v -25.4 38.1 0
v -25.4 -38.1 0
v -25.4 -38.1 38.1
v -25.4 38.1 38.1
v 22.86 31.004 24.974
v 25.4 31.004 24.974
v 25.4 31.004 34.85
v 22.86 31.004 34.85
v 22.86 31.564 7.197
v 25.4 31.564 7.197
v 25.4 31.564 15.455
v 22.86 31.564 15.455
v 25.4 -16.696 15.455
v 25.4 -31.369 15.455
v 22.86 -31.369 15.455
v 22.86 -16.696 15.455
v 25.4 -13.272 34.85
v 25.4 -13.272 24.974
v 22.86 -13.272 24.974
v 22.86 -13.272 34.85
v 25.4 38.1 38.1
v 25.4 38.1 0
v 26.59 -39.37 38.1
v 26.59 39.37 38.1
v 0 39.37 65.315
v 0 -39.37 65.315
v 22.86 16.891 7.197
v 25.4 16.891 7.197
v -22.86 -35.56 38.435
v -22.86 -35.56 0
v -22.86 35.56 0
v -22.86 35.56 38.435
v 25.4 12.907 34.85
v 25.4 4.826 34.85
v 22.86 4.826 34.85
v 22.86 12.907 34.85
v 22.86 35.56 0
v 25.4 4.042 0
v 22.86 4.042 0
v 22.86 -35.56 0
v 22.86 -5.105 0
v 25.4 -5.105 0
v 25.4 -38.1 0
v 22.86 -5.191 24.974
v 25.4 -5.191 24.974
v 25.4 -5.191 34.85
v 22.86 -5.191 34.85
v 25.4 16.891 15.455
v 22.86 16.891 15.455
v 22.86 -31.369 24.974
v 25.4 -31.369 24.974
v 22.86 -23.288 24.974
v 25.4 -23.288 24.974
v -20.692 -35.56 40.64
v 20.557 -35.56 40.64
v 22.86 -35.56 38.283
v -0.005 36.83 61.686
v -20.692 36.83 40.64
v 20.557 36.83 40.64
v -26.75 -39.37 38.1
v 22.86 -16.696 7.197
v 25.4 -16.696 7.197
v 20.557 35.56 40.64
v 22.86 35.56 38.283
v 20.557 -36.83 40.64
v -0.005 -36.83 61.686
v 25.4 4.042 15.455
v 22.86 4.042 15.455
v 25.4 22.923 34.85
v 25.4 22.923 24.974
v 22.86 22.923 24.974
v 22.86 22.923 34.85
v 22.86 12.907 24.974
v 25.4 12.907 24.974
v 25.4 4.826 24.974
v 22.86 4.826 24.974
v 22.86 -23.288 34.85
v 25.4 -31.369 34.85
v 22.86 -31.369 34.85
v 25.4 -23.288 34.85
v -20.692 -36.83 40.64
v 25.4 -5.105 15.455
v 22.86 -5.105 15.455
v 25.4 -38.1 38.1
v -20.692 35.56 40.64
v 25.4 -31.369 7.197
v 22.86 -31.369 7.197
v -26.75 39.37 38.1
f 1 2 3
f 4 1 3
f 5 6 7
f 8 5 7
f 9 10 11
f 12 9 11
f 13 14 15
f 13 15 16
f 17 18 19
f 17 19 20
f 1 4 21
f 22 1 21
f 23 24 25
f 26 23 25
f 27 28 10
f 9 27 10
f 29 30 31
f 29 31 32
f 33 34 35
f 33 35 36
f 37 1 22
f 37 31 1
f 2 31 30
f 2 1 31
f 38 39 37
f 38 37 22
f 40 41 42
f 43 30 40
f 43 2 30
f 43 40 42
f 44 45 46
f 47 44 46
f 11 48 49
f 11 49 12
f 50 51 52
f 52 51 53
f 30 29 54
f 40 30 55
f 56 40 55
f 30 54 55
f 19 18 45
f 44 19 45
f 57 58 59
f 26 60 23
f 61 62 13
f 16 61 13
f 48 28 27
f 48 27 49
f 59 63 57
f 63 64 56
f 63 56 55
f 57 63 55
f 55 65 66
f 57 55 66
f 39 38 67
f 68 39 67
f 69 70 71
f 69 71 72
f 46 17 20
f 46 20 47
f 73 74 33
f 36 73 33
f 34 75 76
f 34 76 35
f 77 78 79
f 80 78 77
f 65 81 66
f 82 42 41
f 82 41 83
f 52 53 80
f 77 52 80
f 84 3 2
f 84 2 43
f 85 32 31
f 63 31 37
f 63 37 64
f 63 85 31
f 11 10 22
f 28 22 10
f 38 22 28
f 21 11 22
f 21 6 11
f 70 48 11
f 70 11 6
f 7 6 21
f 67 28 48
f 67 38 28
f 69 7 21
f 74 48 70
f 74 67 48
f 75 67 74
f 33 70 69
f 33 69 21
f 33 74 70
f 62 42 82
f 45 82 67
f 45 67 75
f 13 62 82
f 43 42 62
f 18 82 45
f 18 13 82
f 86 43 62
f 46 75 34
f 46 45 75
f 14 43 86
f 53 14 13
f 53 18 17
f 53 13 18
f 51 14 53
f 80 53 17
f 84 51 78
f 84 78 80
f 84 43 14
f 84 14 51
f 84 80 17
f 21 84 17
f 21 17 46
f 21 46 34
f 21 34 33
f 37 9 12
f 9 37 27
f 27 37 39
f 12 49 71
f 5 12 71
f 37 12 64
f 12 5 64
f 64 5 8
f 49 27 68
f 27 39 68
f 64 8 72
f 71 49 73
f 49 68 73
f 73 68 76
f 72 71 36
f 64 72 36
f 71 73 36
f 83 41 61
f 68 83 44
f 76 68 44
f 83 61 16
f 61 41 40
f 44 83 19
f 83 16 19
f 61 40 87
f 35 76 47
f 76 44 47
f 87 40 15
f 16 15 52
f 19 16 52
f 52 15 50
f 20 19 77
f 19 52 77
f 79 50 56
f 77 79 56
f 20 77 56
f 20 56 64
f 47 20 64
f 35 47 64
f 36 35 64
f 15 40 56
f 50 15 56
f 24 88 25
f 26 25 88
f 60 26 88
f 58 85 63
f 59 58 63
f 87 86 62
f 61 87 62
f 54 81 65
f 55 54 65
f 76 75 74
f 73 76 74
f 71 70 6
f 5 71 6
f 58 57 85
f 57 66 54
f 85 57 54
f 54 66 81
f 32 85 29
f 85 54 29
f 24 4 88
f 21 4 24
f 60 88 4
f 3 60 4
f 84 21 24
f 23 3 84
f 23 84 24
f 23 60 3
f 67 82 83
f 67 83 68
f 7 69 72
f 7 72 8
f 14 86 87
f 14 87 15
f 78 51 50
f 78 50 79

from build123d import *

# Parameters (mm, degrees)
F0_W          = 50.8
F0_H          = 38.1
F2_DEPTH      = 38.1
F2_DEPTH_BACK = 38.1
F3_DEPTH      = 39.37
F3_DEPTH_BACK = 39.37
F4_T          = -2.54
F6_W          = 9.1468244791
F6_H          = 15.4547751881
F6_W_2        = 8.080781489
F6_H_2        = 9.8759858869
F6_W_3        = 14.6728920285
F6_H_3        = 8.2574296976
F7_DEPTH      = 2.54


# Not quite as in the source:
# - the program builds the solid bodies; features that only make, move or delete a surface that nothing else refers to are left out


with BuildPart() as f2:
    # F0 (on Front) → F2 (new body, two sides)
    with BuildSketch(Plane.XZ) as f2_sk:
        with Locations((0, 19.05)):
            Rectangle(F0_W, F0_H)
    extrude(amount=F2_DEPTH)
    extrude(f2_sk.sketch, amount=-F2_DEPTH_BACK)

    # F1 (on Front) → F3 (join, two sides)
    with BuildSketch(Plane.XZ) as f3_sk:
        Polygon((0, 65.3146550722), (-26.7503901826, 38.1), (26.5896098174, 38.1), align=None)
    extrude(amount=F3_DEPTH)
    extrude(f3_sk.sketch, amount=-F3_DEPTH_BACK)

    # F4
    f4_openings = [f2.faces().sort_by_distance(p)[0] for p in [
        (0, 0, 0),
    ]]
    offset(amount=F4_T, openings=f4_openings, kind=Kind.INTERSECTION)

    # F6 (on offset) → F7 (cut)
    with BuildSketch(Plane.YZ.offset(25.4)):
        with Locations((-0.5318810698, 7.7273875941)):
            Rectangle(F6_W, F6_H)
        with Locations((-27.3286092555, 29.9121104646)):
            Rectangle(F6_W_2, F6_H_2)
        with Locations((-9.2311092555, 29.9121104646)):
            Rectangle(F6_W_2, F6_H_2)
        with Locations((8.8663907445, 29.9121104646)):
            Rectangle(F6_W_2, F6_H_2)
        with Locations((26.9638907445, 29.9121104646)):
            Rectangle(F6_W_2, F6_H_2)
        with Locations((24.2274460142, 11.3260603393)):
            Rectangle(F6_W_3, F6_H_3)
        with Locations((-24.0325539858, 11.3260603393)):
            Rectangle(F6_W_3, F6_H_3)
    extrude(amount=-F7_DEPTH, mode=Mode.SUBTRACT)


solid = f2.part
